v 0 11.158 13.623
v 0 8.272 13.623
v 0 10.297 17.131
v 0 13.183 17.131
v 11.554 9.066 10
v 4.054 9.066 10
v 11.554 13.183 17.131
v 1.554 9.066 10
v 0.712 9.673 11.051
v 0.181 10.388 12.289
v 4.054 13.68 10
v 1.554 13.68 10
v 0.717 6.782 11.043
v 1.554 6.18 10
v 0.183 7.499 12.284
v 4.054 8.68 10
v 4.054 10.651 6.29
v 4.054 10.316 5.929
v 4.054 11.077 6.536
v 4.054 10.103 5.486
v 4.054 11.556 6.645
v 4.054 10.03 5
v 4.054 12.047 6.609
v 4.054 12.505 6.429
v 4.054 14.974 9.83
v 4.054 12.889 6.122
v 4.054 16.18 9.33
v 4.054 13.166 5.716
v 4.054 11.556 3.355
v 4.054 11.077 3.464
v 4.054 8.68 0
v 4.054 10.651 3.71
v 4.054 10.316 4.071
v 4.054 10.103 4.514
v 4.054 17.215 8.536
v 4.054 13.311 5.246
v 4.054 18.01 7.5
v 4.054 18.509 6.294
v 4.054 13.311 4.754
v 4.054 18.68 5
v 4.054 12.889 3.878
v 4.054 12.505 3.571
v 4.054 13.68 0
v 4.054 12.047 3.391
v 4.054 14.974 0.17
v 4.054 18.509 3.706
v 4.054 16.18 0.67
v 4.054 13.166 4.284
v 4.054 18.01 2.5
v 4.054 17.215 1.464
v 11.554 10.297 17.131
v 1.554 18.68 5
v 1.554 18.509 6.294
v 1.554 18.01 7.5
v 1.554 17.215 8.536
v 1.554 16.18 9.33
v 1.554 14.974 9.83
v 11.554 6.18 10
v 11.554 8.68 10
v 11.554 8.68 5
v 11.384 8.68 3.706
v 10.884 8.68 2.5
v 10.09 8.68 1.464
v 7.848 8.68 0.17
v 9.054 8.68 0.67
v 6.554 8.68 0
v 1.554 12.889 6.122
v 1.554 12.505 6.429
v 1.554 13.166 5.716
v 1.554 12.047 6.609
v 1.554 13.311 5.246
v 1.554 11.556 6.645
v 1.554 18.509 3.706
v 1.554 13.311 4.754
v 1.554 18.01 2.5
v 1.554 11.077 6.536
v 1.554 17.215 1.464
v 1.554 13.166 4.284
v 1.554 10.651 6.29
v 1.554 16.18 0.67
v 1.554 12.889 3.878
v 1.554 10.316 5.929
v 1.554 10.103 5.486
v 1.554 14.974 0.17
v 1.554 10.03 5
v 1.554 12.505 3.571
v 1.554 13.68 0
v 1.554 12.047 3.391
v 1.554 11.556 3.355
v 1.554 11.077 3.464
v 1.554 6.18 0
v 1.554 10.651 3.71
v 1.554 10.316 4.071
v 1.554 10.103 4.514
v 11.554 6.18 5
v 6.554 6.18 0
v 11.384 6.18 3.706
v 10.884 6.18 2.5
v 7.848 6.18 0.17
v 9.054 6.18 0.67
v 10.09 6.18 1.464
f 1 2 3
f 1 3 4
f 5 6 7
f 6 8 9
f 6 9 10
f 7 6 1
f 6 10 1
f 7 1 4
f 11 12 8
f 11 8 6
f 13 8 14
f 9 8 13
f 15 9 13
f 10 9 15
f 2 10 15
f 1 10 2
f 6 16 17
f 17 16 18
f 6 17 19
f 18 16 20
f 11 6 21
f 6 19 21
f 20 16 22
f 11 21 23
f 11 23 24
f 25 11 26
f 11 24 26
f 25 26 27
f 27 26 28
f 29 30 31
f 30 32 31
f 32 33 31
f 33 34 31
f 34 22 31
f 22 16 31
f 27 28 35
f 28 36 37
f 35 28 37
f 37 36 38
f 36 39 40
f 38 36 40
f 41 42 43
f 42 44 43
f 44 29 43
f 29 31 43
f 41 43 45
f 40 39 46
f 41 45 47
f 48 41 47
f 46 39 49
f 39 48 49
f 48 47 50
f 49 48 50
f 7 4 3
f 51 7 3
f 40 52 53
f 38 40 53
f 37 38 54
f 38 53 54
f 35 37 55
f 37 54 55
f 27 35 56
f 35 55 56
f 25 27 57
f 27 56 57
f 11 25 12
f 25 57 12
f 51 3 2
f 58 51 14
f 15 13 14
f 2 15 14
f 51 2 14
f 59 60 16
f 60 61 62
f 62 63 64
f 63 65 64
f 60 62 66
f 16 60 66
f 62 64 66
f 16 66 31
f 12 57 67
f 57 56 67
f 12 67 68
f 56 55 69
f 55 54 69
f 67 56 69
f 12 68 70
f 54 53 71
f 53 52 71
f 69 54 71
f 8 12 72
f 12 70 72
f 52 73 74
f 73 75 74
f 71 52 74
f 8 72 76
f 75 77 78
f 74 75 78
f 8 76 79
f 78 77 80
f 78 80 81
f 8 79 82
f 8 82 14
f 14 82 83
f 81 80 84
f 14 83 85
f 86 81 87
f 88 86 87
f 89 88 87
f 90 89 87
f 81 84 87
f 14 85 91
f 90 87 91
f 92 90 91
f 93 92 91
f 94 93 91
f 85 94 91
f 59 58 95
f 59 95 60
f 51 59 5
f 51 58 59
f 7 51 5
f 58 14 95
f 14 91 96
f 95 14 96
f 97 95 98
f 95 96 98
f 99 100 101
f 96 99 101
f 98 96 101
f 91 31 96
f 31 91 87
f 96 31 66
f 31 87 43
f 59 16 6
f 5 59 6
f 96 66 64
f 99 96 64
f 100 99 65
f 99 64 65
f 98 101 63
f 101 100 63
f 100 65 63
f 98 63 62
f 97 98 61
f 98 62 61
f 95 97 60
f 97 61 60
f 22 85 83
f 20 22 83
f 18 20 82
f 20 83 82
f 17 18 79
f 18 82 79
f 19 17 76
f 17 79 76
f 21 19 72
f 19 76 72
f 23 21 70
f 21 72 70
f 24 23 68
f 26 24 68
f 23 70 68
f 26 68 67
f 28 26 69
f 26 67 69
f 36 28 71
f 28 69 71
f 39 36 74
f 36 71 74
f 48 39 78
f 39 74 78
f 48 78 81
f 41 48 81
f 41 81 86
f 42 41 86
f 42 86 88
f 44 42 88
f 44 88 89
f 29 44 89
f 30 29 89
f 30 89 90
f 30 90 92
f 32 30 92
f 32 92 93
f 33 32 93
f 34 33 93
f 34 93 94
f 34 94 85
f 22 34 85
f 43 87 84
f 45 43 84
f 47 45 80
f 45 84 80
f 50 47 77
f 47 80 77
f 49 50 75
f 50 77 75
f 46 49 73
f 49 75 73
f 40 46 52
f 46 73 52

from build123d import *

# Parameters (mm, degrees)
F1_DEPTH    = 10
F4_DEPTH    = 11.5542393178
F5_D        = 3.3
F6_T1_DEPTH = 27.5
F6_T3_DEPTH = 27.5
F6_T5_DEPTH = 21.0021683442


# Not quite as in the source:
# - a fillet or chamfer that OpenCascade refuses, or shapes differently, is made with other operations: its cross-section is extruded or revolved along the edge and cut away or added


with BuildPart() as f1:
    # F0 (on Top) → F1 (new body)
    with BuildSketch(Plane.XY):
        Polygon((4.0542393178, 8.6797312124), (4.0542393178, 18.6797312124), (1.5542393178, 18.6797312124), (1.5542393178, 8.6797312124), (1.5542393178, 6.1797312124), (11.5542393178, 6.1797312124), (11.5542393178, 8.6797312124), align=None)
    extrude(amount=F1_DEPTH)

    # F3 (on Right) → F4 (join, through all)
    with BuildSketch(Plane.YZ):
        Polygon((10.296677351, 17.1307598841), (6.1797312124, 10), (9.0664825583, 10), (13.183428697, 17.1307598841), align=None)
    extrude(amount=F4_DEPTH)

    # F5 (through all)
    with Locations(Plane.YZ.offset(4.0542393178)):
        with Locations((11.6797312124, 5)):
            Hole(F5_D / 2)

    # F6: fillet of radius 5 on 4 edges, made by hand

    # F6_s2 → F6_t1 (cut)
    with BuildSketch(Plane.YZ.offset(-10.9457606822)):
        with BuildLine():
            ThreePointArc((13.6797312124, 0), (17.2152651183, 1.4644660941), (18.6797312124, 5))
            Line((18.6797312124, 5), (18.6797312124, 0))
            Line((18.6797312124, 0), (13.6797312124, 0))
        make_face()
        with BuildLine():
            ThreePointArc((18.6797312124, 5), (17.2152651183, 8.5355339059), (13.6797312124, 10))
            Line((13.6797312124, 10), (18.6797312124, 10))
            Line((18.6797312124, 10), (18.6797312124, 5))
        make_face()
    extrude(amount=F6_T1_DEPTH, mode=Mode.SUBTRACT)

    # F6_s4 → F6_t3 (cut)
    with BuildSketch(Plane.XZ.offset(-21.1797312124)):
        with BuildLine():
            ThreePointArc((6.5542393178, 0), (10.0897732237, 1.4644660941), (11.5542393178, 5))
            Line((11.5542393178, 5), (11.5542393178, 0))
            Line((11.5542393178, 0), (6.5542393178, 0))
        make_face()
    extrude(amount=F6_T3_DEPTH, mode=Mode.SUBTRACT)

    # F6_s6 → F6_t5 (cut)
    with BuildSketch(Plane.XZ.offset(-18.1241910575)):
        with BuildLine():
            ThreePointArc((1.5542393178, 10), (0.4049590094, 11.6518912998), (0, 13.6230833997))
            Line((0, 13.6230833997), (0, 10))
            Line((0, 10), (1.5542393178, 10))
        make_face()
    extrude(amount=F6_T5_DEPTH, mode=Mode.SUBTRACT)


solid = f1.part
